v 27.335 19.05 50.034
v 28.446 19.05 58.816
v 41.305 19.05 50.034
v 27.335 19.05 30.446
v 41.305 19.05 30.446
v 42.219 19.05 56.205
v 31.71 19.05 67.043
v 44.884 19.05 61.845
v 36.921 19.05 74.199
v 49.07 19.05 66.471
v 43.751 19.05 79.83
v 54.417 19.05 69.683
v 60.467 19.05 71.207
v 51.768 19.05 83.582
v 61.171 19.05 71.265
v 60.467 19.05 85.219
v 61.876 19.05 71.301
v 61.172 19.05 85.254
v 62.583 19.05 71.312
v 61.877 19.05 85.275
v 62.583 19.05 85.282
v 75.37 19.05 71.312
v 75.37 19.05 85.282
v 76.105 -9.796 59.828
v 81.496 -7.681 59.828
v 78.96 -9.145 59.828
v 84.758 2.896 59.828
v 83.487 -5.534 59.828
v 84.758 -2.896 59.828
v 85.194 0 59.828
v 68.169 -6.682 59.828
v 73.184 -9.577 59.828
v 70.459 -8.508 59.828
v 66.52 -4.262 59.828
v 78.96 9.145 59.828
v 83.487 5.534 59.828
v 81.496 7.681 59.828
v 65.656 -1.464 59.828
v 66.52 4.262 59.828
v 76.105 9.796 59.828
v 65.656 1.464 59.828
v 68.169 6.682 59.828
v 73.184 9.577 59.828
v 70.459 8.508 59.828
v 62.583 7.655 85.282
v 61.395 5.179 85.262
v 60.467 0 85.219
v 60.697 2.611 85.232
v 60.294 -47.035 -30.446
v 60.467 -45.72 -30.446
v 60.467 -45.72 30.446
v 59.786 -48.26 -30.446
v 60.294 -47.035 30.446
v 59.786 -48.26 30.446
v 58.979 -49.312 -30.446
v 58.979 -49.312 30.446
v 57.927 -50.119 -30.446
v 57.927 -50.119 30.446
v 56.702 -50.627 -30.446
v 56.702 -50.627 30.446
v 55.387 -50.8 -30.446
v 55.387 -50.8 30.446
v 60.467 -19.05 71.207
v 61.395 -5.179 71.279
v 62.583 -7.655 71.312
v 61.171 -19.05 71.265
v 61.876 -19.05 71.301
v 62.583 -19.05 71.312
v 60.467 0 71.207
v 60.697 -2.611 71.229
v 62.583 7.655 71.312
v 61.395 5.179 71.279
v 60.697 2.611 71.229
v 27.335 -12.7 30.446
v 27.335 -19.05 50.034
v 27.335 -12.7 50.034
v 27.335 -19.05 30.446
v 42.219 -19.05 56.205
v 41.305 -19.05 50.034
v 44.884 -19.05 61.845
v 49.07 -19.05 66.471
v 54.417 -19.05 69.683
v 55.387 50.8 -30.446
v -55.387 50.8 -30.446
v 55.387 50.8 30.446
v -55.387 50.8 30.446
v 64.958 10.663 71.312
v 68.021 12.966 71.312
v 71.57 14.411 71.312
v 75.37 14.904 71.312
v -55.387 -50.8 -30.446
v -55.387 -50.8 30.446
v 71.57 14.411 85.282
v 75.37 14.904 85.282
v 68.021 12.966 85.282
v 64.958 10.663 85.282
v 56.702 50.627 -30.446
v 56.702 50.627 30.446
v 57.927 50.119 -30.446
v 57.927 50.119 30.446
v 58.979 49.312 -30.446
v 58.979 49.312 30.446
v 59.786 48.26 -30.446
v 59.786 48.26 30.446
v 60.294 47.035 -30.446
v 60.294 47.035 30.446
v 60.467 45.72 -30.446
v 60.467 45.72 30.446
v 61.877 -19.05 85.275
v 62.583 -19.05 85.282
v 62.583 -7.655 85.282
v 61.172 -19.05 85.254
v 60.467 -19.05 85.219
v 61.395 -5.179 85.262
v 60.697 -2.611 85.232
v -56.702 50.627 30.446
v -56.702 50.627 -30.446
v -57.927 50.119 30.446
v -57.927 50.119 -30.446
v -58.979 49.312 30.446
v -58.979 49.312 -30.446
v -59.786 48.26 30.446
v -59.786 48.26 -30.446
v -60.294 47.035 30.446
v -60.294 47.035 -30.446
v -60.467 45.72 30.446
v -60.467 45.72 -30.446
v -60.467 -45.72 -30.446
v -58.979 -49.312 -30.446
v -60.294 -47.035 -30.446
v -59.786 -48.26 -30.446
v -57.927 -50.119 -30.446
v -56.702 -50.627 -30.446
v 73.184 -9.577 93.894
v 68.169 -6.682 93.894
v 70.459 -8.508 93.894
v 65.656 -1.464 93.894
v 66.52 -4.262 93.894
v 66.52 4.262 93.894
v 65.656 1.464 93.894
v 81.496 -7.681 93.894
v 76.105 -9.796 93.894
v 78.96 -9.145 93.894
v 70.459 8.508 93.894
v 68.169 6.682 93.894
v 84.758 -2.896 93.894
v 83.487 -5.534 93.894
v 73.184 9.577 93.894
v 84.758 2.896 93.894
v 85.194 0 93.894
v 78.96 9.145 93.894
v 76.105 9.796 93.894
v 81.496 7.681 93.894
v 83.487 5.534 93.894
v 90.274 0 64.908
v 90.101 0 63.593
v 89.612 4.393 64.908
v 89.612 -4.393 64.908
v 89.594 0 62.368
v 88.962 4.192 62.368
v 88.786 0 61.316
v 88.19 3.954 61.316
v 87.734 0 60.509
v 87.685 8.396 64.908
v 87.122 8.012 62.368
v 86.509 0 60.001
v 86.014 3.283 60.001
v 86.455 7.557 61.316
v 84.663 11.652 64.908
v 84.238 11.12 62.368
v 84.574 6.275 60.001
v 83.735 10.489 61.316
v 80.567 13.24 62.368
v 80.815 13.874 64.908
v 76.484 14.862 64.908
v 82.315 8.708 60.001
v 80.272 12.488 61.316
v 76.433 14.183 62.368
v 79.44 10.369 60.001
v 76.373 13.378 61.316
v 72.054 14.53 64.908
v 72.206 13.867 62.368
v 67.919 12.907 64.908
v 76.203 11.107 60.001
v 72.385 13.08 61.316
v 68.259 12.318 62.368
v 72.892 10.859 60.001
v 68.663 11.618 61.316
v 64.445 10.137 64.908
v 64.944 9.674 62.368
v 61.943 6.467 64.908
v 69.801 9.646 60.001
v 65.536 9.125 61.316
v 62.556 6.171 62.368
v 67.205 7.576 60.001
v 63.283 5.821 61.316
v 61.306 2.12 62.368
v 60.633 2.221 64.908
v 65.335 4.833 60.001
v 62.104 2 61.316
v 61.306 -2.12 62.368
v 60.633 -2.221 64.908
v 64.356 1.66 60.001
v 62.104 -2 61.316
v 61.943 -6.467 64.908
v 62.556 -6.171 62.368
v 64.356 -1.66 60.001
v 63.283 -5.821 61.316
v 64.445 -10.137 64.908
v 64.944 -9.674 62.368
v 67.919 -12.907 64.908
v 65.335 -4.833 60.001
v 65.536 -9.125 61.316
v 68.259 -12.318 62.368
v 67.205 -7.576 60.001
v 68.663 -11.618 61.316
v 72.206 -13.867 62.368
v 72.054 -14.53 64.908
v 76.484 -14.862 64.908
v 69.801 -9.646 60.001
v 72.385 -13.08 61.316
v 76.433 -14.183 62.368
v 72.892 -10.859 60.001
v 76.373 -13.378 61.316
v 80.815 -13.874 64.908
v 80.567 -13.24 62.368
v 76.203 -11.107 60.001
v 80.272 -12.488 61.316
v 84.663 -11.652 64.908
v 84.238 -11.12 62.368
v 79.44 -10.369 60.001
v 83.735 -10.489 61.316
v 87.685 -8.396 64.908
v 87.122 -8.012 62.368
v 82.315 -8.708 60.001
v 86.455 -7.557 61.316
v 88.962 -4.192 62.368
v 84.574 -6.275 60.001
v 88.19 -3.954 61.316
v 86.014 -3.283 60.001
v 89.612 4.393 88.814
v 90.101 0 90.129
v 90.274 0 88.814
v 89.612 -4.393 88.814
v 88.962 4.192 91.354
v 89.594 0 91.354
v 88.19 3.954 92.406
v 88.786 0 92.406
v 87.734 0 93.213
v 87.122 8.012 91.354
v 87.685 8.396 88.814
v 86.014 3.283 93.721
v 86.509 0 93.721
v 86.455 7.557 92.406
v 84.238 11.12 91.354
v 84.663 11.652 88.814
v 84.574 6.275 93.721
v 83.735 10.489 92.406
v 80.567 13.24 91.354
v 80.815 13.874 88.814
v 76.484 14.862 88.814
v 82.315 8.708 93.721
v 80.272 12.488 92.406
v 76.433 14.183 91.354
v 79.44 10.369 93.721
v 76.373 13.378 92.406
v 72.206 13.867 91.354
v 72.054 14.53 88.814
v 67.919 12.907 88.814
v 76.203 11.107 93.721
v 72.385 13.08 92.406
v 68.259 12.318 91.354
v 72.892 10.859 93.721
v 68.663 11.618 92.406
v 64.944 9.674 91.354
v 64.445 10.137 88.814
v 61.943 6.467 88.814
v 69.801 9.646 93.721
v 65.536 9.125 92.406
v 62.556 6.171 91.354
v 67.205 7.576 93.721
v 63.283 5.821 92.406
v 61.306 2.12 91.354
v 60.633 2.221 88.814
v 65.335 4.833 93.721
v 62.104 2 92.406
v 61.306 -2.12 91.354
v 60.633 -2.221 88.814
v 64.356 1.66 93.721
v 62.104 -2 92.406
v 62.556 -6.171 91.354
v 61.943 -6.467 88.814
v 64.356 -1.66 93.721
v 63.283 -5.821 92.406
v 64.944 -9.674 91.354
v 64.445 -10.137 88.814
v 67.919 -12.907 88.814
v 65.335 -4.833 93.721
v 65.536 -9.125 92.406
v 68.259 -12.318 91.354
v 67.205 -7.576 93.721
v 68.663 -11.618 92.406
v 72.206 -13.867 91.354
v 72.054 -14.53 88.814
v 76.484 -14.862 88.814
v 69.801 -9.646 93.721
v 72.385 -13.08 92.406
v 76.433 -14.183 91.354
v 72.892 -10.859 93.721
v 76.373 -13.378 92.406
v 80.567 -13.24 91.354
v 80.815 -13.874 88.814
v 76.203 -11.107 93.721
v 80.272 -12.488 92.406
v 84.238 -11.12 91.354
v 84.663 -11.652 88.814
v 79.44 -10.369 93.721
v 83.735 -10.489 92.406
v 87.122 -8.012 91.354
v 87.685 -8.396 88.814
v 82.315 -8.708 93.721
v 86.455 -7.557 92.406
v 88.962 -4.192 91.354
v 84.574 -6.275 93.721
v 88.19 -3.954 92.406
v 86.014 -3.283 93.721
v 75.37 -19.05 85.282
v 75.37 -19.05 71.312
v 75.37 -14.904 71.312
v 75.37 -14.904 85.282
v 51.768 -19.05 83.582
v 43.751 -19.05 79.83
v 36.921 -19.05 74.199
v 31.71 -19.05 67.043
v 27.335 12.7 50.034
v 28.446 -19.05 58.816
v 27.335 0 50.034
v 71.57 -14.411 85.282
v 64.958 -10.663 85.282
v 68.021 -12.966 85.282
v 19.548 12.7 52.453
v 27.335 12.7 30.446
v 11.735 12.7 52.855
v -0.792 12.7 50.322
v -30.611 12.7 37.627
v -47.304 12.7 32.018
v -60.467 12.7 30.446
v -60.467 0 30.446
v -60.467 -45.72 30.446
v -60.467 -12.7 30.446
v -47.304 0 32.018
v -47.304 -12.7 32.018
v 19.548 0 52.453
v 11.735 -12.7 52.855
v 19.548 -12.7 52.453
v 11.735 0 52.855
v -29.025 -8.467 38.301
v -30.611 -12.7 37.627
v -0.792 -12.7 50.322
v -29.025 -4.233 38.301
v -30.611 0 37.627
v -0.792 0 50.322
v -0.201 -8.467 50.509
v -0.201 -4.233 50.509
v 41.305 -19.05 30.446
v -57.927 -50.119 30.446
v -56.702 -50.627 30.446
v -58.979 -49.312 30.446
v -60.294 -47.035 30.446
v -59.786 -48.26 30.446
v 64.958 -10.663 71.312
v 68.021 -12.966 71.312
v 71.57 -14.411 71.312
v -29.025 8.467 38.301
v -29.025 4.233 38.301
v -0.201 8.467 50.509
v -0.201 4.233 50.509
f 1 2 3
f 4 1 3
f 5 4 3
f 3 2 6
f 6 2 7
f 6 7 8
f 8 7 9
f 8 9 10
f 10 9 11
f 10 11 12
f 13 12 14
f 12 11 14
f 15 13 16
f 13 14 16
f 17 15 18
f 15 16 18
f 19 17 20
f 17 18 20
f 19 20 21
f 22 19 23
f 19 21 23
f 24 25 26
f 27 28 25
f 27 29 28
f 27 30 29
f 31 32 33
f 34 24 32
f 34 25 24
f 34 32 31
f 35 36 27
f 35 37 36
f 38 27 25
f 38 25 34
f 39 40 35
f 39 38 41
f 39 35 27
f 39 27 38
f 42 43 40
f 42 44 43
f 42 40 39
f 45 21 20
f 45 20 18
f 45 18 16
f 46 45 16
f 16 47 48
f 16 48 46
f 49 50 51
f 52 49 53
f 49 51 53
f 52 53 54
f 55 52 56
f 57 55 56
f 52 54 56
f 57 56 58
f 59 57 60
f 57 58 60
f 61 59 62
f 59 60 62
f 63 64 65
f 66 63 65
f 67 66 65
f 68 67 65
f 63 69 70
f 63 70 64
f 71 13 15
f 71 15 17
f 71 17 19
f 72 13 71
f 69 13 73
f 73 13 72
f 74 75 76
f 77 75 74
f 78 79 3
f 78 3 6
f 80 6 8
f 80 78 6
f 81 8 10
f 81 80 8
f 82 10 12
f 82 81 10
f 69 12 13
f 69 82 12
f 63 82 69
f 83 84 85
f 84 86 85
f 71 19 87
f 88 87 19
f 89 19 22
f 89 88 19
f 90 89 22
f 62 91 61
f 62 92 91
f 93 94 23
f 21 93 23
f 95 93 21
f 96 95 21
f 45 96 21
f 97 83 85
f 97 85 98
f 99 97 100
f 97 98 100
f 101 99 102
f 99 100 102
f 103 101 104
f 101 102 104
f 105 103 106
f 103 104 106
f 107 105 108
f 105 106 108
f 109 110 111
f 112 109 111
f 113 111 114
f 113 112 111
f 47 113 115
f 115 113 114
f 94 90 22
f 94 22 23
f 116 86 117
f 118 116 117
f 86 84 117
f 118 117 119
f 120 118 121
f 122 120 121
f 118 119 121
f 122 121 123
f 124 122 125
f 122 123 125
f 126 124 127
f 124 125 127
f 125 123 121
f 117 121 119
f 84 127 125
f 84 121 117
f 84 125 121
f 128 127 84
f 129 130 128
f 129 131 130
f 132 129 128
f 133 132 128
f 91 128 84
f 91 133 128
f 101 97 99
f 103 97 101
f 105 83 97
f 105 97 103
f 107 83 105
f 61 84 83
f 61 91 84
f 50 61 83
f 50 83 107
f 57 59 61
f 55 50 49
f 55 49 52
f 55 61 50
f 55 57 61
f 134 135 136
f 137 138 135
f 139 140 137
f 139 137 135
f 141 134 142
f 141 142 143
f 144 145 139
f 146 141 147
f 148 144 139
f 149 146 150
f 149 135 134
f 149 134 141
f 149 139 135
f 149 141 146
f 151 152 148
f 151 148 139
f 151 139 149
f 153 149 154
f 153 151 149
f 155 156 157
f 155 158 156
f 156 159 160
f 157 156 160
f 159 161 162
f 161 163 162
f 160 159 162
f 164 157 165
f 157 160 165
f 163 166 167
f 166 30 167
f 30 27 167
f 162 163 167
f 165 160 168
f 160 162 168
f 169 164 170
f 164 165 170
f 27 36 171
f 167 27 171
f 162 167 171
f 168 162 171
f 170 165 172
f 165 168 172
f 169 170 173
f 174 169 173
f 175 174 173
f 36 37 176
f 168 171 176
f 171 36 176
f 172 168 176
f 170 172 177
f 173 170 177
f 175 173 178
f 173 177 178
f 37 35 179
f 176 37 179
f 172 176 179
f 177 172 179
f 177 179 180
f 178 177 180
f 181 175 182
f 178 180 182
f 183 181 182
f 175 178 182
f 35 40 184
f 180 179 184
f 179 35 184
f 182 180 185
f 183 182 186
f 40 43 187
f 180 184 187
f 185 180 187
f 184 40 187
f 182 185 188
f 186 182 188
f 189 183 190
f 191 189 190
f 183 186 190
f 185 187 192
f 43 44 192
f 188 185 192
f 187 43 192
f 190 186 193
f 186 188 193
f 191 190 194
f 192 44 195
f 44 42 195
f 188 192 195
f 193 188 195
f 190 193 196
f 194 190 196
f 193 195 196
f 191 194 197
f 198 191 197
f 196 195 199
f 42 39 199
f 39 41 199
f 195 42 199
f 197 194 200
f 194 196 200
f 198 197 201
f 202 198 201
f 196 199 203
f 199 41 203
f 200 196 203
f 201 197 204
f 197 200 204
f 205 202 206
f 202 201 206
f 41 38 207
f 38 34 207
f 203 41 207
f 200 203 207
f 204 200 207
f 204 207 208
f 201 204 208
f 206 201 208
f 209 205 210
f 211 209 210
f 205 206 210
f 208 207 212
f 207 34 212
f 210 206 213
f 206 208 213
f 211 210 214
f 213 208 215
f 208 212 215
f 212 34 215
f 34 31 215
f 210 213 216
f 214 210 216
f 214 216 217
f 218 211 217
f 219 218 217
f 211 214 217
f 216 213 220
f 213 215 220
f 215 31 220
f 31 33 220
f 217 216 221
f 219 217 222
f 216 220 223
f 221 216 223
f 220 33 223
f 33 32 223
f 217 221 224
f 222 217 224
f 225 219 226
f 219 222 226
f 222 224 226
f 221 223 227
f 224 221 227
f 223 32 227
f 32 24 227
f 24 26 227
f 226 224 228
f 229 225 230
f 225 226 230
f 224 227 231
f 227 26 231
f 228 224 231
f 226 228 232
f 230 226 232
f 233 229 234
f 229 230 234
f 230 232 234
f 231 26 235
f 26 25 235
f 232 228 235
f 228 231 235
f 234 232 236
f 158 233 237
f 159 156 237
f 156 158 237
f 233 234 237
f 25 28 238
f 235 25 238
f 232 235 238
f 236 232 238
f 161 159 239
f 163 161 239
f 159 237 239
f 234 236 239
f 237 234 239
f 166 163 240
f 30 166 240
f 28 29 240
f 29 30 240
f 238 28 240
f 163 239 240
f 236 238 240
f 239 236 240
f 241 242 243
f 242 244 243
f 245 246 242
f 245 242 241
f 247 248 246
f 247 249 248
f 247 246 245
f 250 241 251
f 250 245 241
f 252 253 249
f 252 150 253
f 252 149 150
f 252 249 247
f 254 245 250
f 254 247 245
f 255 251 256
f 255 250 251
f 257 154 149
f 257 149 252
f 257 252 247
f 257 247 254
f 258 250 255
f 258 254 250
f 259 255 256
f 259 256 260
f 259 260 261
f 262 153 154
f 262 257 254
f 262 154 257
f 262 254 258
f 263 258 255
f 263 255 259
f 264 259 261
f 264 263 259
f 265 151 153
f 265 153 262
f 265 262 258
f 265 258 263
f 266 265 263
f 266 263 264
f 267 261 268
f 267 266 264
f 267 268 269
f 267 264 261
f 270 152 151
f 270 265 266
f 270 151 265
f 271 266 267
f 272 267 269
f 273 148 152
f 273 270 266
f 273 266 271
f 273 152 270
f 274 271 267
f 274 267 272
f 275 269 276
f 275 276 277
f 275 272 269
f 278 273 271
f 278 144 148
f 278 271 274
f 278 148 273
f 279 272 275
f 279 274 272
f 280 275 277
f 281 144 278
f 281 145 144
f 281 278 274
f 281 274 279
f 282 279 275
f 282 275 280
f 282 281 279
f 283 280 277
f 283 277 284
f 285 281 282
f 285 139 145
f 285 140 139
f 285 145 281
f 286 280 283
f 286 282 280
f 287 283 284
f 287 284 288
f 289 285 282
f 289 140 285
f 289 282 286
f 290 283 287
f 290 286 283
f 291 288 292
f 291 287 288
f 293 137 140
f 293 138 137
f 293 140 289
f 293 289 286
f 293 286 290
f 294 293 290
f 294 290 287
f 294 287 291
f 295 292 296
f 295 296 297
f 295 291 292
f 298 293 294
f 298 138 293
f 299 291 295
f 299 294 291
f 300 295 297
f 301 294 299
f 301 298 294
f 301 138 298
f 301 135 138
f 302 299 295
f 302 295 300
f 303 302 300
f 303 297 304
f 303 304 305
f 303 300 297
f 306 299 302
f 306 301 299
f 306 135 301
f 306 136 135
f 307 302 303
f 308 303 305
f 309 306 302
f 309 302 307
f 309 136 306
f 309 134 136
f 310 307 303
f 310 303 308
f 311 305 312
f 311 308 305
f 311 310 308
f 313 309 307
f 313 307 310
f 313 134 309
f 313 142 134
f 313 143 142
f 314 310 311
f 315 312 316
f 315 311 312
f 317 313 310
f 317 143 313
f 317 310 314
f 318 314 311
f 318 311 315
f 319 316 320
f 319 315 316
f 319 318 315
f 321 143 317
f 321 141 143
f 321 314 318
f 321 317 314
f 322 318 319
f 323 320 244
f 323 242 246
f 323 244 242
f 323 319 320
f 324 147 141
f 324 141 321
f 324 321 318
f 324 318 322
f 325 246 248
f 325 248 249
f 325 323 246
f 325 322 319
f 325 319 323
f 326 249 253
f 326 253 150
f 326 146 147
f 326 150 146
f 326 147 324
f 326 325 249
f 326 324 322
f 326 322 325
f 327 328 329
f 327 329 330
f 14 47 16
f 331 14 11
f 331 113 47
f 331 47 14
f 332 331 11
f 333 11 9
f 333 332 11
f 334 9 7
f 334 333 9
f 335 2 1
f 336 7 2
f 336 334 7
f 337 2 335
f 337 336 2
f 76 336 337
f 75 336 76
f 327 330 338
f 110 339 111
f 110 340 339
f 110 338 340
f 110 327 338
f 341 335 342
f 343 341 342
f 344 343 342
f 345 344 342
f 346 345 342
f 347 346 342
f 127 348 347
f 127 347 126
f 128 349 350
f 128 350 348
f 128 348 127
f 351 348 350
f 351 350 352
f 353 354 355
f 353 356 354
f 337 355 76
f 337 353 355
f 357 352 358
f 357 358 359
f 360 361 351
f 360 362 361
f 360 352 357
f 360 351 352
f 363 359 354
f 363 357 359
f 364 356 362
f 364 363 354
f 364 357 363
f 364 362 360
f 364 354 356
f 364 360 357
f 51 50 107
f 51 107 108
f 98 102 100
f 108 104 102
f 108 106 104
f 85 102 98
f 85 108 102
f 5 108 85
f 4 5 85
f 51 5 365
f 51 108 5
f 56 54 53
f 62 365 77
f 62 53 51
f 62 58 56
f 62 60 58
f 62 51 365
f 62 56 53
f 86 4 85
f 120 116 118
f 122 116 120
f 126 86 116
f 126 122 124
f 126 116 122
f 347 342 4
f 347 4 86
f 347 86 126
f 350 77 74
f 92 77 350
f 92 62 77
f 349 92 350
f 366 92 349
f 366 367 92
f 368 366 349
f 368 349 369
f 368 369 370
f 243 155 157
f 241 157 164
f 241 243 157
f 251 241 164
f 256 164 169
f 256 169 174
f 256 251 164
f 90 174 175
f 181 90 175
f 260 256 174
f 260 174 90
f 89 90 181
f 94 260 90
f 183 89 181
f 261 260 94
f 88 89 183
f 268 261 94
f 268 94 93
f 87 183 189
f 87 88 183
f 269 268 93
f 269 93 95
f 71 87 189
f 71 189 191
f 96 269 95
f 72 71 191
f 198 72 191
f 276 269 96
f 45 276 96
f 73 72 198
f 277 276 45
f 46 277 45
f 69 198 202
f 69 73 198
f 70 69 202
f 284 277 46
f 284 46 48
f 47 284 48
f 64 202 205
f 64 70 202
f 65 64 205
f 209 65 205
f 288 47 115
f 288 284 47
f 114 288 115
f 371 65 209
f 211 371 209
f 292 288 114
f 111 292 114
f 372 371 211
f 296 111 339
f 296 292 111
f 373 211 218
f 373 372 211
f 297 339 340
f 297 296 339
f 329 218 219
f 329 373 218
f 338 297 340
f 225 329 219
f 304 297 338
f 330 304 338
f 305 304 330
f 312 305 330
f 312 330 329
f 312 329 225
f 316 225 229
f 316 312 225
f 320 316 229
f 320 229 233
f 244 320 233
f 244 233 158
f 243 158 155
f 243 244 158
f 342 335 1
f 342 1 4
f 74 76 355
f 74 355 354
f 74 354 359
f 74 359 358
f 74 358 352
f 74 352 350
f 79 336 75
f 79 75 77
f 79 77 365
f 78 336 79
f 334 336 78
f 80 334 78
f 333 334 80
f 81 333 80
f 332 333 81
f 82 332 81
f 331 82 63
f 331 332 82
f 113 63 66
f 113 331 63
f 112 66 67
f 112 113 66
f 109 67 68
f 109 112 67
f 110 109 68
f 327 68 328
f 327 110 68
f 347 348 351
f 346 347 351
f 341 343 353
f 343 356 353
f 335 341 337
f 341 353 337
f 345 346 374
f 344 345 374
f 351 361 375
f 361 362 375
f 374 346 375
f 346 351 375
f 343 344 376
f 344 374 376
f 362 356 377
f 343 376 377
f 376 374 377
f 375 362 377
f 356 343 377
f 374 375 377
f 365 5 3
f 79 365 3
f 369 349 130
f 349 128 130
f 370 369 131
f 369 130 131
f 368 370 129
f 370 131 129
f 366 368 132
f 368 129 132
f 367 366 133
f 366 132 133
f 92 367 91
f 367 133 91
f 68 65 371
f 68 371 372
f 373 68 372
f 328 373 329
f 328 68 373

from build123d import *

# Parameters (mm, degrees)
F1_DEPTH = 50.8
F2_DEPTH = 19.05
F3_DEPTH = 19.05
F5_R     = 5.08
F6_R     = 5.08
F7_DEPTH = 12.7


with BuildPart() as f1:
    # F0 (on Front) → F1 (new body, symmetric)
    with BuildSketch(Plane.XZ):
        Polygon((-60.4666993022, 30.4462667555), (-60.4666993022, -30.4462667555), (60.4666993022, -30.4462667555), (60.4666993022, 30.4462667555), (41.3047336042, 30.4462667555), (27.3347329348, 30.4462667555), align=None)
    extrude(amount=F1_DEPTH, both=True)

    # F0 (on Front) → F2 (join, symmetric)
    with BuildSketch(Plane.XZ):
        with BuildLine():
            Line((27.3347329348, 50.0340685248), (27.3347329348, 30.4462667555))
            Line((27.3347329348, 30.4462667555), (41.3047336042, 30.4462667555))
            Line((41.3047336042, 30.4462667555), (41.3047336042, 50.0340685248))
            ThreePointArc((41.3047336042, 50.0340685248), (46.8065044858, 64.3122336797), (60.4666993022, 71.2067648895))
            Line((60.4666993022, 71.2067648895), (60.4666993022, 85.2186777329))
            ThreePointArc((60.4666993022, 85.2186777329), (36.9213956127, 74.1985254838), (27.3347329348, 50.0340685248))
        make_face()
    extrude(amount=F2_DEPTH, both=True)

    # F0 (on Front) → F3 (join, symmetric)
    with BuildSketch(Plane.XZ):
        with BuildLine():
            ThreePointArc((62.5829263954, 85.2822619854), (61.5243353427, 85.2663623363), (60.4666993022, 85.2186777329))
            Line((60.4666993022, 85.2186777329), (60.4666993022, 71.2067648895))
            ThreePointArc((60.4666993022, 71.2067648895), (61.5234988842, 71.2858708439), (62.5829263954, 71.312261316))
            Line((62.5829263954, 71.312261316), (75.3704831004, 71.312261316))
            Line((75.3704831004, 71.312261316), (75.3704831004, 85.2822619854))
            Line((75.3704831004, 85.2822619854), (62.5829263954, 85.2822619854))
        make_face()
    extrude(amount=F3_DEPTH, both=True)

    # F0 (on Front) → F4 (revolve)
    with BuildSketch(Plane.XZ):
        Polygon((90.2742668986, 93.8937179744), (75.3704831004, 93.8937179744), (75.3704831004, 85.2822619854), (75.3704831004, 71.312261316), (75.3704831004, 59.8279722035), (90.2742668986, 59.8279722035), align=None)
    revolve(axis=Axis((75.3704831004, 0, 76.860845089), (0, 0, 1)))

    # F5
    f5_edges = [f1.edges().sort_by_distance(p)[0] for p in [
        (60.466699, -50.8, 0),
        (60.466699, 50.8, 0),
        (-60.466699, 50.8, 0),
        (-60.466699, -50.8, 0),
    ]]
    fillet(f5_edges, radius=F5_R)

    # F6
    f6_edges = [f1.edges().sort_by_distance(p)[0] for p in [
        (60.466699, 0, 93.893718),
        (60.466699, 0, 59.827972),
    ]]
    fillet(f6_edges, radius=F6_R)

    # F0 (on Front) → F7 (join, symmetric)
    with BuildSketch(Plane.XZ):
        with BuildLine():
            add(Edge.make_bspline(
                [(-60.4666993022, 30.4462667555), (-27.2727292031, 30.4462667555), (0, 62.5284537673), (27.3347329348, 50.0340685248)],
                knots=[0, 0, 0, 0, 89.9598437139, 89.9598437139, 89.9598437139, 89.9598437139], degree=3))
            Line((-60.4666993022, 30.4462667555), (27.3347329348, 30.4462667555))
            Line((27.3347329348, 30.4462667555), (27.3347329348, 50.0340685248))
        make_face()
    extrude(amount=F7_DEPTH, both=True)


solid = f1.part
